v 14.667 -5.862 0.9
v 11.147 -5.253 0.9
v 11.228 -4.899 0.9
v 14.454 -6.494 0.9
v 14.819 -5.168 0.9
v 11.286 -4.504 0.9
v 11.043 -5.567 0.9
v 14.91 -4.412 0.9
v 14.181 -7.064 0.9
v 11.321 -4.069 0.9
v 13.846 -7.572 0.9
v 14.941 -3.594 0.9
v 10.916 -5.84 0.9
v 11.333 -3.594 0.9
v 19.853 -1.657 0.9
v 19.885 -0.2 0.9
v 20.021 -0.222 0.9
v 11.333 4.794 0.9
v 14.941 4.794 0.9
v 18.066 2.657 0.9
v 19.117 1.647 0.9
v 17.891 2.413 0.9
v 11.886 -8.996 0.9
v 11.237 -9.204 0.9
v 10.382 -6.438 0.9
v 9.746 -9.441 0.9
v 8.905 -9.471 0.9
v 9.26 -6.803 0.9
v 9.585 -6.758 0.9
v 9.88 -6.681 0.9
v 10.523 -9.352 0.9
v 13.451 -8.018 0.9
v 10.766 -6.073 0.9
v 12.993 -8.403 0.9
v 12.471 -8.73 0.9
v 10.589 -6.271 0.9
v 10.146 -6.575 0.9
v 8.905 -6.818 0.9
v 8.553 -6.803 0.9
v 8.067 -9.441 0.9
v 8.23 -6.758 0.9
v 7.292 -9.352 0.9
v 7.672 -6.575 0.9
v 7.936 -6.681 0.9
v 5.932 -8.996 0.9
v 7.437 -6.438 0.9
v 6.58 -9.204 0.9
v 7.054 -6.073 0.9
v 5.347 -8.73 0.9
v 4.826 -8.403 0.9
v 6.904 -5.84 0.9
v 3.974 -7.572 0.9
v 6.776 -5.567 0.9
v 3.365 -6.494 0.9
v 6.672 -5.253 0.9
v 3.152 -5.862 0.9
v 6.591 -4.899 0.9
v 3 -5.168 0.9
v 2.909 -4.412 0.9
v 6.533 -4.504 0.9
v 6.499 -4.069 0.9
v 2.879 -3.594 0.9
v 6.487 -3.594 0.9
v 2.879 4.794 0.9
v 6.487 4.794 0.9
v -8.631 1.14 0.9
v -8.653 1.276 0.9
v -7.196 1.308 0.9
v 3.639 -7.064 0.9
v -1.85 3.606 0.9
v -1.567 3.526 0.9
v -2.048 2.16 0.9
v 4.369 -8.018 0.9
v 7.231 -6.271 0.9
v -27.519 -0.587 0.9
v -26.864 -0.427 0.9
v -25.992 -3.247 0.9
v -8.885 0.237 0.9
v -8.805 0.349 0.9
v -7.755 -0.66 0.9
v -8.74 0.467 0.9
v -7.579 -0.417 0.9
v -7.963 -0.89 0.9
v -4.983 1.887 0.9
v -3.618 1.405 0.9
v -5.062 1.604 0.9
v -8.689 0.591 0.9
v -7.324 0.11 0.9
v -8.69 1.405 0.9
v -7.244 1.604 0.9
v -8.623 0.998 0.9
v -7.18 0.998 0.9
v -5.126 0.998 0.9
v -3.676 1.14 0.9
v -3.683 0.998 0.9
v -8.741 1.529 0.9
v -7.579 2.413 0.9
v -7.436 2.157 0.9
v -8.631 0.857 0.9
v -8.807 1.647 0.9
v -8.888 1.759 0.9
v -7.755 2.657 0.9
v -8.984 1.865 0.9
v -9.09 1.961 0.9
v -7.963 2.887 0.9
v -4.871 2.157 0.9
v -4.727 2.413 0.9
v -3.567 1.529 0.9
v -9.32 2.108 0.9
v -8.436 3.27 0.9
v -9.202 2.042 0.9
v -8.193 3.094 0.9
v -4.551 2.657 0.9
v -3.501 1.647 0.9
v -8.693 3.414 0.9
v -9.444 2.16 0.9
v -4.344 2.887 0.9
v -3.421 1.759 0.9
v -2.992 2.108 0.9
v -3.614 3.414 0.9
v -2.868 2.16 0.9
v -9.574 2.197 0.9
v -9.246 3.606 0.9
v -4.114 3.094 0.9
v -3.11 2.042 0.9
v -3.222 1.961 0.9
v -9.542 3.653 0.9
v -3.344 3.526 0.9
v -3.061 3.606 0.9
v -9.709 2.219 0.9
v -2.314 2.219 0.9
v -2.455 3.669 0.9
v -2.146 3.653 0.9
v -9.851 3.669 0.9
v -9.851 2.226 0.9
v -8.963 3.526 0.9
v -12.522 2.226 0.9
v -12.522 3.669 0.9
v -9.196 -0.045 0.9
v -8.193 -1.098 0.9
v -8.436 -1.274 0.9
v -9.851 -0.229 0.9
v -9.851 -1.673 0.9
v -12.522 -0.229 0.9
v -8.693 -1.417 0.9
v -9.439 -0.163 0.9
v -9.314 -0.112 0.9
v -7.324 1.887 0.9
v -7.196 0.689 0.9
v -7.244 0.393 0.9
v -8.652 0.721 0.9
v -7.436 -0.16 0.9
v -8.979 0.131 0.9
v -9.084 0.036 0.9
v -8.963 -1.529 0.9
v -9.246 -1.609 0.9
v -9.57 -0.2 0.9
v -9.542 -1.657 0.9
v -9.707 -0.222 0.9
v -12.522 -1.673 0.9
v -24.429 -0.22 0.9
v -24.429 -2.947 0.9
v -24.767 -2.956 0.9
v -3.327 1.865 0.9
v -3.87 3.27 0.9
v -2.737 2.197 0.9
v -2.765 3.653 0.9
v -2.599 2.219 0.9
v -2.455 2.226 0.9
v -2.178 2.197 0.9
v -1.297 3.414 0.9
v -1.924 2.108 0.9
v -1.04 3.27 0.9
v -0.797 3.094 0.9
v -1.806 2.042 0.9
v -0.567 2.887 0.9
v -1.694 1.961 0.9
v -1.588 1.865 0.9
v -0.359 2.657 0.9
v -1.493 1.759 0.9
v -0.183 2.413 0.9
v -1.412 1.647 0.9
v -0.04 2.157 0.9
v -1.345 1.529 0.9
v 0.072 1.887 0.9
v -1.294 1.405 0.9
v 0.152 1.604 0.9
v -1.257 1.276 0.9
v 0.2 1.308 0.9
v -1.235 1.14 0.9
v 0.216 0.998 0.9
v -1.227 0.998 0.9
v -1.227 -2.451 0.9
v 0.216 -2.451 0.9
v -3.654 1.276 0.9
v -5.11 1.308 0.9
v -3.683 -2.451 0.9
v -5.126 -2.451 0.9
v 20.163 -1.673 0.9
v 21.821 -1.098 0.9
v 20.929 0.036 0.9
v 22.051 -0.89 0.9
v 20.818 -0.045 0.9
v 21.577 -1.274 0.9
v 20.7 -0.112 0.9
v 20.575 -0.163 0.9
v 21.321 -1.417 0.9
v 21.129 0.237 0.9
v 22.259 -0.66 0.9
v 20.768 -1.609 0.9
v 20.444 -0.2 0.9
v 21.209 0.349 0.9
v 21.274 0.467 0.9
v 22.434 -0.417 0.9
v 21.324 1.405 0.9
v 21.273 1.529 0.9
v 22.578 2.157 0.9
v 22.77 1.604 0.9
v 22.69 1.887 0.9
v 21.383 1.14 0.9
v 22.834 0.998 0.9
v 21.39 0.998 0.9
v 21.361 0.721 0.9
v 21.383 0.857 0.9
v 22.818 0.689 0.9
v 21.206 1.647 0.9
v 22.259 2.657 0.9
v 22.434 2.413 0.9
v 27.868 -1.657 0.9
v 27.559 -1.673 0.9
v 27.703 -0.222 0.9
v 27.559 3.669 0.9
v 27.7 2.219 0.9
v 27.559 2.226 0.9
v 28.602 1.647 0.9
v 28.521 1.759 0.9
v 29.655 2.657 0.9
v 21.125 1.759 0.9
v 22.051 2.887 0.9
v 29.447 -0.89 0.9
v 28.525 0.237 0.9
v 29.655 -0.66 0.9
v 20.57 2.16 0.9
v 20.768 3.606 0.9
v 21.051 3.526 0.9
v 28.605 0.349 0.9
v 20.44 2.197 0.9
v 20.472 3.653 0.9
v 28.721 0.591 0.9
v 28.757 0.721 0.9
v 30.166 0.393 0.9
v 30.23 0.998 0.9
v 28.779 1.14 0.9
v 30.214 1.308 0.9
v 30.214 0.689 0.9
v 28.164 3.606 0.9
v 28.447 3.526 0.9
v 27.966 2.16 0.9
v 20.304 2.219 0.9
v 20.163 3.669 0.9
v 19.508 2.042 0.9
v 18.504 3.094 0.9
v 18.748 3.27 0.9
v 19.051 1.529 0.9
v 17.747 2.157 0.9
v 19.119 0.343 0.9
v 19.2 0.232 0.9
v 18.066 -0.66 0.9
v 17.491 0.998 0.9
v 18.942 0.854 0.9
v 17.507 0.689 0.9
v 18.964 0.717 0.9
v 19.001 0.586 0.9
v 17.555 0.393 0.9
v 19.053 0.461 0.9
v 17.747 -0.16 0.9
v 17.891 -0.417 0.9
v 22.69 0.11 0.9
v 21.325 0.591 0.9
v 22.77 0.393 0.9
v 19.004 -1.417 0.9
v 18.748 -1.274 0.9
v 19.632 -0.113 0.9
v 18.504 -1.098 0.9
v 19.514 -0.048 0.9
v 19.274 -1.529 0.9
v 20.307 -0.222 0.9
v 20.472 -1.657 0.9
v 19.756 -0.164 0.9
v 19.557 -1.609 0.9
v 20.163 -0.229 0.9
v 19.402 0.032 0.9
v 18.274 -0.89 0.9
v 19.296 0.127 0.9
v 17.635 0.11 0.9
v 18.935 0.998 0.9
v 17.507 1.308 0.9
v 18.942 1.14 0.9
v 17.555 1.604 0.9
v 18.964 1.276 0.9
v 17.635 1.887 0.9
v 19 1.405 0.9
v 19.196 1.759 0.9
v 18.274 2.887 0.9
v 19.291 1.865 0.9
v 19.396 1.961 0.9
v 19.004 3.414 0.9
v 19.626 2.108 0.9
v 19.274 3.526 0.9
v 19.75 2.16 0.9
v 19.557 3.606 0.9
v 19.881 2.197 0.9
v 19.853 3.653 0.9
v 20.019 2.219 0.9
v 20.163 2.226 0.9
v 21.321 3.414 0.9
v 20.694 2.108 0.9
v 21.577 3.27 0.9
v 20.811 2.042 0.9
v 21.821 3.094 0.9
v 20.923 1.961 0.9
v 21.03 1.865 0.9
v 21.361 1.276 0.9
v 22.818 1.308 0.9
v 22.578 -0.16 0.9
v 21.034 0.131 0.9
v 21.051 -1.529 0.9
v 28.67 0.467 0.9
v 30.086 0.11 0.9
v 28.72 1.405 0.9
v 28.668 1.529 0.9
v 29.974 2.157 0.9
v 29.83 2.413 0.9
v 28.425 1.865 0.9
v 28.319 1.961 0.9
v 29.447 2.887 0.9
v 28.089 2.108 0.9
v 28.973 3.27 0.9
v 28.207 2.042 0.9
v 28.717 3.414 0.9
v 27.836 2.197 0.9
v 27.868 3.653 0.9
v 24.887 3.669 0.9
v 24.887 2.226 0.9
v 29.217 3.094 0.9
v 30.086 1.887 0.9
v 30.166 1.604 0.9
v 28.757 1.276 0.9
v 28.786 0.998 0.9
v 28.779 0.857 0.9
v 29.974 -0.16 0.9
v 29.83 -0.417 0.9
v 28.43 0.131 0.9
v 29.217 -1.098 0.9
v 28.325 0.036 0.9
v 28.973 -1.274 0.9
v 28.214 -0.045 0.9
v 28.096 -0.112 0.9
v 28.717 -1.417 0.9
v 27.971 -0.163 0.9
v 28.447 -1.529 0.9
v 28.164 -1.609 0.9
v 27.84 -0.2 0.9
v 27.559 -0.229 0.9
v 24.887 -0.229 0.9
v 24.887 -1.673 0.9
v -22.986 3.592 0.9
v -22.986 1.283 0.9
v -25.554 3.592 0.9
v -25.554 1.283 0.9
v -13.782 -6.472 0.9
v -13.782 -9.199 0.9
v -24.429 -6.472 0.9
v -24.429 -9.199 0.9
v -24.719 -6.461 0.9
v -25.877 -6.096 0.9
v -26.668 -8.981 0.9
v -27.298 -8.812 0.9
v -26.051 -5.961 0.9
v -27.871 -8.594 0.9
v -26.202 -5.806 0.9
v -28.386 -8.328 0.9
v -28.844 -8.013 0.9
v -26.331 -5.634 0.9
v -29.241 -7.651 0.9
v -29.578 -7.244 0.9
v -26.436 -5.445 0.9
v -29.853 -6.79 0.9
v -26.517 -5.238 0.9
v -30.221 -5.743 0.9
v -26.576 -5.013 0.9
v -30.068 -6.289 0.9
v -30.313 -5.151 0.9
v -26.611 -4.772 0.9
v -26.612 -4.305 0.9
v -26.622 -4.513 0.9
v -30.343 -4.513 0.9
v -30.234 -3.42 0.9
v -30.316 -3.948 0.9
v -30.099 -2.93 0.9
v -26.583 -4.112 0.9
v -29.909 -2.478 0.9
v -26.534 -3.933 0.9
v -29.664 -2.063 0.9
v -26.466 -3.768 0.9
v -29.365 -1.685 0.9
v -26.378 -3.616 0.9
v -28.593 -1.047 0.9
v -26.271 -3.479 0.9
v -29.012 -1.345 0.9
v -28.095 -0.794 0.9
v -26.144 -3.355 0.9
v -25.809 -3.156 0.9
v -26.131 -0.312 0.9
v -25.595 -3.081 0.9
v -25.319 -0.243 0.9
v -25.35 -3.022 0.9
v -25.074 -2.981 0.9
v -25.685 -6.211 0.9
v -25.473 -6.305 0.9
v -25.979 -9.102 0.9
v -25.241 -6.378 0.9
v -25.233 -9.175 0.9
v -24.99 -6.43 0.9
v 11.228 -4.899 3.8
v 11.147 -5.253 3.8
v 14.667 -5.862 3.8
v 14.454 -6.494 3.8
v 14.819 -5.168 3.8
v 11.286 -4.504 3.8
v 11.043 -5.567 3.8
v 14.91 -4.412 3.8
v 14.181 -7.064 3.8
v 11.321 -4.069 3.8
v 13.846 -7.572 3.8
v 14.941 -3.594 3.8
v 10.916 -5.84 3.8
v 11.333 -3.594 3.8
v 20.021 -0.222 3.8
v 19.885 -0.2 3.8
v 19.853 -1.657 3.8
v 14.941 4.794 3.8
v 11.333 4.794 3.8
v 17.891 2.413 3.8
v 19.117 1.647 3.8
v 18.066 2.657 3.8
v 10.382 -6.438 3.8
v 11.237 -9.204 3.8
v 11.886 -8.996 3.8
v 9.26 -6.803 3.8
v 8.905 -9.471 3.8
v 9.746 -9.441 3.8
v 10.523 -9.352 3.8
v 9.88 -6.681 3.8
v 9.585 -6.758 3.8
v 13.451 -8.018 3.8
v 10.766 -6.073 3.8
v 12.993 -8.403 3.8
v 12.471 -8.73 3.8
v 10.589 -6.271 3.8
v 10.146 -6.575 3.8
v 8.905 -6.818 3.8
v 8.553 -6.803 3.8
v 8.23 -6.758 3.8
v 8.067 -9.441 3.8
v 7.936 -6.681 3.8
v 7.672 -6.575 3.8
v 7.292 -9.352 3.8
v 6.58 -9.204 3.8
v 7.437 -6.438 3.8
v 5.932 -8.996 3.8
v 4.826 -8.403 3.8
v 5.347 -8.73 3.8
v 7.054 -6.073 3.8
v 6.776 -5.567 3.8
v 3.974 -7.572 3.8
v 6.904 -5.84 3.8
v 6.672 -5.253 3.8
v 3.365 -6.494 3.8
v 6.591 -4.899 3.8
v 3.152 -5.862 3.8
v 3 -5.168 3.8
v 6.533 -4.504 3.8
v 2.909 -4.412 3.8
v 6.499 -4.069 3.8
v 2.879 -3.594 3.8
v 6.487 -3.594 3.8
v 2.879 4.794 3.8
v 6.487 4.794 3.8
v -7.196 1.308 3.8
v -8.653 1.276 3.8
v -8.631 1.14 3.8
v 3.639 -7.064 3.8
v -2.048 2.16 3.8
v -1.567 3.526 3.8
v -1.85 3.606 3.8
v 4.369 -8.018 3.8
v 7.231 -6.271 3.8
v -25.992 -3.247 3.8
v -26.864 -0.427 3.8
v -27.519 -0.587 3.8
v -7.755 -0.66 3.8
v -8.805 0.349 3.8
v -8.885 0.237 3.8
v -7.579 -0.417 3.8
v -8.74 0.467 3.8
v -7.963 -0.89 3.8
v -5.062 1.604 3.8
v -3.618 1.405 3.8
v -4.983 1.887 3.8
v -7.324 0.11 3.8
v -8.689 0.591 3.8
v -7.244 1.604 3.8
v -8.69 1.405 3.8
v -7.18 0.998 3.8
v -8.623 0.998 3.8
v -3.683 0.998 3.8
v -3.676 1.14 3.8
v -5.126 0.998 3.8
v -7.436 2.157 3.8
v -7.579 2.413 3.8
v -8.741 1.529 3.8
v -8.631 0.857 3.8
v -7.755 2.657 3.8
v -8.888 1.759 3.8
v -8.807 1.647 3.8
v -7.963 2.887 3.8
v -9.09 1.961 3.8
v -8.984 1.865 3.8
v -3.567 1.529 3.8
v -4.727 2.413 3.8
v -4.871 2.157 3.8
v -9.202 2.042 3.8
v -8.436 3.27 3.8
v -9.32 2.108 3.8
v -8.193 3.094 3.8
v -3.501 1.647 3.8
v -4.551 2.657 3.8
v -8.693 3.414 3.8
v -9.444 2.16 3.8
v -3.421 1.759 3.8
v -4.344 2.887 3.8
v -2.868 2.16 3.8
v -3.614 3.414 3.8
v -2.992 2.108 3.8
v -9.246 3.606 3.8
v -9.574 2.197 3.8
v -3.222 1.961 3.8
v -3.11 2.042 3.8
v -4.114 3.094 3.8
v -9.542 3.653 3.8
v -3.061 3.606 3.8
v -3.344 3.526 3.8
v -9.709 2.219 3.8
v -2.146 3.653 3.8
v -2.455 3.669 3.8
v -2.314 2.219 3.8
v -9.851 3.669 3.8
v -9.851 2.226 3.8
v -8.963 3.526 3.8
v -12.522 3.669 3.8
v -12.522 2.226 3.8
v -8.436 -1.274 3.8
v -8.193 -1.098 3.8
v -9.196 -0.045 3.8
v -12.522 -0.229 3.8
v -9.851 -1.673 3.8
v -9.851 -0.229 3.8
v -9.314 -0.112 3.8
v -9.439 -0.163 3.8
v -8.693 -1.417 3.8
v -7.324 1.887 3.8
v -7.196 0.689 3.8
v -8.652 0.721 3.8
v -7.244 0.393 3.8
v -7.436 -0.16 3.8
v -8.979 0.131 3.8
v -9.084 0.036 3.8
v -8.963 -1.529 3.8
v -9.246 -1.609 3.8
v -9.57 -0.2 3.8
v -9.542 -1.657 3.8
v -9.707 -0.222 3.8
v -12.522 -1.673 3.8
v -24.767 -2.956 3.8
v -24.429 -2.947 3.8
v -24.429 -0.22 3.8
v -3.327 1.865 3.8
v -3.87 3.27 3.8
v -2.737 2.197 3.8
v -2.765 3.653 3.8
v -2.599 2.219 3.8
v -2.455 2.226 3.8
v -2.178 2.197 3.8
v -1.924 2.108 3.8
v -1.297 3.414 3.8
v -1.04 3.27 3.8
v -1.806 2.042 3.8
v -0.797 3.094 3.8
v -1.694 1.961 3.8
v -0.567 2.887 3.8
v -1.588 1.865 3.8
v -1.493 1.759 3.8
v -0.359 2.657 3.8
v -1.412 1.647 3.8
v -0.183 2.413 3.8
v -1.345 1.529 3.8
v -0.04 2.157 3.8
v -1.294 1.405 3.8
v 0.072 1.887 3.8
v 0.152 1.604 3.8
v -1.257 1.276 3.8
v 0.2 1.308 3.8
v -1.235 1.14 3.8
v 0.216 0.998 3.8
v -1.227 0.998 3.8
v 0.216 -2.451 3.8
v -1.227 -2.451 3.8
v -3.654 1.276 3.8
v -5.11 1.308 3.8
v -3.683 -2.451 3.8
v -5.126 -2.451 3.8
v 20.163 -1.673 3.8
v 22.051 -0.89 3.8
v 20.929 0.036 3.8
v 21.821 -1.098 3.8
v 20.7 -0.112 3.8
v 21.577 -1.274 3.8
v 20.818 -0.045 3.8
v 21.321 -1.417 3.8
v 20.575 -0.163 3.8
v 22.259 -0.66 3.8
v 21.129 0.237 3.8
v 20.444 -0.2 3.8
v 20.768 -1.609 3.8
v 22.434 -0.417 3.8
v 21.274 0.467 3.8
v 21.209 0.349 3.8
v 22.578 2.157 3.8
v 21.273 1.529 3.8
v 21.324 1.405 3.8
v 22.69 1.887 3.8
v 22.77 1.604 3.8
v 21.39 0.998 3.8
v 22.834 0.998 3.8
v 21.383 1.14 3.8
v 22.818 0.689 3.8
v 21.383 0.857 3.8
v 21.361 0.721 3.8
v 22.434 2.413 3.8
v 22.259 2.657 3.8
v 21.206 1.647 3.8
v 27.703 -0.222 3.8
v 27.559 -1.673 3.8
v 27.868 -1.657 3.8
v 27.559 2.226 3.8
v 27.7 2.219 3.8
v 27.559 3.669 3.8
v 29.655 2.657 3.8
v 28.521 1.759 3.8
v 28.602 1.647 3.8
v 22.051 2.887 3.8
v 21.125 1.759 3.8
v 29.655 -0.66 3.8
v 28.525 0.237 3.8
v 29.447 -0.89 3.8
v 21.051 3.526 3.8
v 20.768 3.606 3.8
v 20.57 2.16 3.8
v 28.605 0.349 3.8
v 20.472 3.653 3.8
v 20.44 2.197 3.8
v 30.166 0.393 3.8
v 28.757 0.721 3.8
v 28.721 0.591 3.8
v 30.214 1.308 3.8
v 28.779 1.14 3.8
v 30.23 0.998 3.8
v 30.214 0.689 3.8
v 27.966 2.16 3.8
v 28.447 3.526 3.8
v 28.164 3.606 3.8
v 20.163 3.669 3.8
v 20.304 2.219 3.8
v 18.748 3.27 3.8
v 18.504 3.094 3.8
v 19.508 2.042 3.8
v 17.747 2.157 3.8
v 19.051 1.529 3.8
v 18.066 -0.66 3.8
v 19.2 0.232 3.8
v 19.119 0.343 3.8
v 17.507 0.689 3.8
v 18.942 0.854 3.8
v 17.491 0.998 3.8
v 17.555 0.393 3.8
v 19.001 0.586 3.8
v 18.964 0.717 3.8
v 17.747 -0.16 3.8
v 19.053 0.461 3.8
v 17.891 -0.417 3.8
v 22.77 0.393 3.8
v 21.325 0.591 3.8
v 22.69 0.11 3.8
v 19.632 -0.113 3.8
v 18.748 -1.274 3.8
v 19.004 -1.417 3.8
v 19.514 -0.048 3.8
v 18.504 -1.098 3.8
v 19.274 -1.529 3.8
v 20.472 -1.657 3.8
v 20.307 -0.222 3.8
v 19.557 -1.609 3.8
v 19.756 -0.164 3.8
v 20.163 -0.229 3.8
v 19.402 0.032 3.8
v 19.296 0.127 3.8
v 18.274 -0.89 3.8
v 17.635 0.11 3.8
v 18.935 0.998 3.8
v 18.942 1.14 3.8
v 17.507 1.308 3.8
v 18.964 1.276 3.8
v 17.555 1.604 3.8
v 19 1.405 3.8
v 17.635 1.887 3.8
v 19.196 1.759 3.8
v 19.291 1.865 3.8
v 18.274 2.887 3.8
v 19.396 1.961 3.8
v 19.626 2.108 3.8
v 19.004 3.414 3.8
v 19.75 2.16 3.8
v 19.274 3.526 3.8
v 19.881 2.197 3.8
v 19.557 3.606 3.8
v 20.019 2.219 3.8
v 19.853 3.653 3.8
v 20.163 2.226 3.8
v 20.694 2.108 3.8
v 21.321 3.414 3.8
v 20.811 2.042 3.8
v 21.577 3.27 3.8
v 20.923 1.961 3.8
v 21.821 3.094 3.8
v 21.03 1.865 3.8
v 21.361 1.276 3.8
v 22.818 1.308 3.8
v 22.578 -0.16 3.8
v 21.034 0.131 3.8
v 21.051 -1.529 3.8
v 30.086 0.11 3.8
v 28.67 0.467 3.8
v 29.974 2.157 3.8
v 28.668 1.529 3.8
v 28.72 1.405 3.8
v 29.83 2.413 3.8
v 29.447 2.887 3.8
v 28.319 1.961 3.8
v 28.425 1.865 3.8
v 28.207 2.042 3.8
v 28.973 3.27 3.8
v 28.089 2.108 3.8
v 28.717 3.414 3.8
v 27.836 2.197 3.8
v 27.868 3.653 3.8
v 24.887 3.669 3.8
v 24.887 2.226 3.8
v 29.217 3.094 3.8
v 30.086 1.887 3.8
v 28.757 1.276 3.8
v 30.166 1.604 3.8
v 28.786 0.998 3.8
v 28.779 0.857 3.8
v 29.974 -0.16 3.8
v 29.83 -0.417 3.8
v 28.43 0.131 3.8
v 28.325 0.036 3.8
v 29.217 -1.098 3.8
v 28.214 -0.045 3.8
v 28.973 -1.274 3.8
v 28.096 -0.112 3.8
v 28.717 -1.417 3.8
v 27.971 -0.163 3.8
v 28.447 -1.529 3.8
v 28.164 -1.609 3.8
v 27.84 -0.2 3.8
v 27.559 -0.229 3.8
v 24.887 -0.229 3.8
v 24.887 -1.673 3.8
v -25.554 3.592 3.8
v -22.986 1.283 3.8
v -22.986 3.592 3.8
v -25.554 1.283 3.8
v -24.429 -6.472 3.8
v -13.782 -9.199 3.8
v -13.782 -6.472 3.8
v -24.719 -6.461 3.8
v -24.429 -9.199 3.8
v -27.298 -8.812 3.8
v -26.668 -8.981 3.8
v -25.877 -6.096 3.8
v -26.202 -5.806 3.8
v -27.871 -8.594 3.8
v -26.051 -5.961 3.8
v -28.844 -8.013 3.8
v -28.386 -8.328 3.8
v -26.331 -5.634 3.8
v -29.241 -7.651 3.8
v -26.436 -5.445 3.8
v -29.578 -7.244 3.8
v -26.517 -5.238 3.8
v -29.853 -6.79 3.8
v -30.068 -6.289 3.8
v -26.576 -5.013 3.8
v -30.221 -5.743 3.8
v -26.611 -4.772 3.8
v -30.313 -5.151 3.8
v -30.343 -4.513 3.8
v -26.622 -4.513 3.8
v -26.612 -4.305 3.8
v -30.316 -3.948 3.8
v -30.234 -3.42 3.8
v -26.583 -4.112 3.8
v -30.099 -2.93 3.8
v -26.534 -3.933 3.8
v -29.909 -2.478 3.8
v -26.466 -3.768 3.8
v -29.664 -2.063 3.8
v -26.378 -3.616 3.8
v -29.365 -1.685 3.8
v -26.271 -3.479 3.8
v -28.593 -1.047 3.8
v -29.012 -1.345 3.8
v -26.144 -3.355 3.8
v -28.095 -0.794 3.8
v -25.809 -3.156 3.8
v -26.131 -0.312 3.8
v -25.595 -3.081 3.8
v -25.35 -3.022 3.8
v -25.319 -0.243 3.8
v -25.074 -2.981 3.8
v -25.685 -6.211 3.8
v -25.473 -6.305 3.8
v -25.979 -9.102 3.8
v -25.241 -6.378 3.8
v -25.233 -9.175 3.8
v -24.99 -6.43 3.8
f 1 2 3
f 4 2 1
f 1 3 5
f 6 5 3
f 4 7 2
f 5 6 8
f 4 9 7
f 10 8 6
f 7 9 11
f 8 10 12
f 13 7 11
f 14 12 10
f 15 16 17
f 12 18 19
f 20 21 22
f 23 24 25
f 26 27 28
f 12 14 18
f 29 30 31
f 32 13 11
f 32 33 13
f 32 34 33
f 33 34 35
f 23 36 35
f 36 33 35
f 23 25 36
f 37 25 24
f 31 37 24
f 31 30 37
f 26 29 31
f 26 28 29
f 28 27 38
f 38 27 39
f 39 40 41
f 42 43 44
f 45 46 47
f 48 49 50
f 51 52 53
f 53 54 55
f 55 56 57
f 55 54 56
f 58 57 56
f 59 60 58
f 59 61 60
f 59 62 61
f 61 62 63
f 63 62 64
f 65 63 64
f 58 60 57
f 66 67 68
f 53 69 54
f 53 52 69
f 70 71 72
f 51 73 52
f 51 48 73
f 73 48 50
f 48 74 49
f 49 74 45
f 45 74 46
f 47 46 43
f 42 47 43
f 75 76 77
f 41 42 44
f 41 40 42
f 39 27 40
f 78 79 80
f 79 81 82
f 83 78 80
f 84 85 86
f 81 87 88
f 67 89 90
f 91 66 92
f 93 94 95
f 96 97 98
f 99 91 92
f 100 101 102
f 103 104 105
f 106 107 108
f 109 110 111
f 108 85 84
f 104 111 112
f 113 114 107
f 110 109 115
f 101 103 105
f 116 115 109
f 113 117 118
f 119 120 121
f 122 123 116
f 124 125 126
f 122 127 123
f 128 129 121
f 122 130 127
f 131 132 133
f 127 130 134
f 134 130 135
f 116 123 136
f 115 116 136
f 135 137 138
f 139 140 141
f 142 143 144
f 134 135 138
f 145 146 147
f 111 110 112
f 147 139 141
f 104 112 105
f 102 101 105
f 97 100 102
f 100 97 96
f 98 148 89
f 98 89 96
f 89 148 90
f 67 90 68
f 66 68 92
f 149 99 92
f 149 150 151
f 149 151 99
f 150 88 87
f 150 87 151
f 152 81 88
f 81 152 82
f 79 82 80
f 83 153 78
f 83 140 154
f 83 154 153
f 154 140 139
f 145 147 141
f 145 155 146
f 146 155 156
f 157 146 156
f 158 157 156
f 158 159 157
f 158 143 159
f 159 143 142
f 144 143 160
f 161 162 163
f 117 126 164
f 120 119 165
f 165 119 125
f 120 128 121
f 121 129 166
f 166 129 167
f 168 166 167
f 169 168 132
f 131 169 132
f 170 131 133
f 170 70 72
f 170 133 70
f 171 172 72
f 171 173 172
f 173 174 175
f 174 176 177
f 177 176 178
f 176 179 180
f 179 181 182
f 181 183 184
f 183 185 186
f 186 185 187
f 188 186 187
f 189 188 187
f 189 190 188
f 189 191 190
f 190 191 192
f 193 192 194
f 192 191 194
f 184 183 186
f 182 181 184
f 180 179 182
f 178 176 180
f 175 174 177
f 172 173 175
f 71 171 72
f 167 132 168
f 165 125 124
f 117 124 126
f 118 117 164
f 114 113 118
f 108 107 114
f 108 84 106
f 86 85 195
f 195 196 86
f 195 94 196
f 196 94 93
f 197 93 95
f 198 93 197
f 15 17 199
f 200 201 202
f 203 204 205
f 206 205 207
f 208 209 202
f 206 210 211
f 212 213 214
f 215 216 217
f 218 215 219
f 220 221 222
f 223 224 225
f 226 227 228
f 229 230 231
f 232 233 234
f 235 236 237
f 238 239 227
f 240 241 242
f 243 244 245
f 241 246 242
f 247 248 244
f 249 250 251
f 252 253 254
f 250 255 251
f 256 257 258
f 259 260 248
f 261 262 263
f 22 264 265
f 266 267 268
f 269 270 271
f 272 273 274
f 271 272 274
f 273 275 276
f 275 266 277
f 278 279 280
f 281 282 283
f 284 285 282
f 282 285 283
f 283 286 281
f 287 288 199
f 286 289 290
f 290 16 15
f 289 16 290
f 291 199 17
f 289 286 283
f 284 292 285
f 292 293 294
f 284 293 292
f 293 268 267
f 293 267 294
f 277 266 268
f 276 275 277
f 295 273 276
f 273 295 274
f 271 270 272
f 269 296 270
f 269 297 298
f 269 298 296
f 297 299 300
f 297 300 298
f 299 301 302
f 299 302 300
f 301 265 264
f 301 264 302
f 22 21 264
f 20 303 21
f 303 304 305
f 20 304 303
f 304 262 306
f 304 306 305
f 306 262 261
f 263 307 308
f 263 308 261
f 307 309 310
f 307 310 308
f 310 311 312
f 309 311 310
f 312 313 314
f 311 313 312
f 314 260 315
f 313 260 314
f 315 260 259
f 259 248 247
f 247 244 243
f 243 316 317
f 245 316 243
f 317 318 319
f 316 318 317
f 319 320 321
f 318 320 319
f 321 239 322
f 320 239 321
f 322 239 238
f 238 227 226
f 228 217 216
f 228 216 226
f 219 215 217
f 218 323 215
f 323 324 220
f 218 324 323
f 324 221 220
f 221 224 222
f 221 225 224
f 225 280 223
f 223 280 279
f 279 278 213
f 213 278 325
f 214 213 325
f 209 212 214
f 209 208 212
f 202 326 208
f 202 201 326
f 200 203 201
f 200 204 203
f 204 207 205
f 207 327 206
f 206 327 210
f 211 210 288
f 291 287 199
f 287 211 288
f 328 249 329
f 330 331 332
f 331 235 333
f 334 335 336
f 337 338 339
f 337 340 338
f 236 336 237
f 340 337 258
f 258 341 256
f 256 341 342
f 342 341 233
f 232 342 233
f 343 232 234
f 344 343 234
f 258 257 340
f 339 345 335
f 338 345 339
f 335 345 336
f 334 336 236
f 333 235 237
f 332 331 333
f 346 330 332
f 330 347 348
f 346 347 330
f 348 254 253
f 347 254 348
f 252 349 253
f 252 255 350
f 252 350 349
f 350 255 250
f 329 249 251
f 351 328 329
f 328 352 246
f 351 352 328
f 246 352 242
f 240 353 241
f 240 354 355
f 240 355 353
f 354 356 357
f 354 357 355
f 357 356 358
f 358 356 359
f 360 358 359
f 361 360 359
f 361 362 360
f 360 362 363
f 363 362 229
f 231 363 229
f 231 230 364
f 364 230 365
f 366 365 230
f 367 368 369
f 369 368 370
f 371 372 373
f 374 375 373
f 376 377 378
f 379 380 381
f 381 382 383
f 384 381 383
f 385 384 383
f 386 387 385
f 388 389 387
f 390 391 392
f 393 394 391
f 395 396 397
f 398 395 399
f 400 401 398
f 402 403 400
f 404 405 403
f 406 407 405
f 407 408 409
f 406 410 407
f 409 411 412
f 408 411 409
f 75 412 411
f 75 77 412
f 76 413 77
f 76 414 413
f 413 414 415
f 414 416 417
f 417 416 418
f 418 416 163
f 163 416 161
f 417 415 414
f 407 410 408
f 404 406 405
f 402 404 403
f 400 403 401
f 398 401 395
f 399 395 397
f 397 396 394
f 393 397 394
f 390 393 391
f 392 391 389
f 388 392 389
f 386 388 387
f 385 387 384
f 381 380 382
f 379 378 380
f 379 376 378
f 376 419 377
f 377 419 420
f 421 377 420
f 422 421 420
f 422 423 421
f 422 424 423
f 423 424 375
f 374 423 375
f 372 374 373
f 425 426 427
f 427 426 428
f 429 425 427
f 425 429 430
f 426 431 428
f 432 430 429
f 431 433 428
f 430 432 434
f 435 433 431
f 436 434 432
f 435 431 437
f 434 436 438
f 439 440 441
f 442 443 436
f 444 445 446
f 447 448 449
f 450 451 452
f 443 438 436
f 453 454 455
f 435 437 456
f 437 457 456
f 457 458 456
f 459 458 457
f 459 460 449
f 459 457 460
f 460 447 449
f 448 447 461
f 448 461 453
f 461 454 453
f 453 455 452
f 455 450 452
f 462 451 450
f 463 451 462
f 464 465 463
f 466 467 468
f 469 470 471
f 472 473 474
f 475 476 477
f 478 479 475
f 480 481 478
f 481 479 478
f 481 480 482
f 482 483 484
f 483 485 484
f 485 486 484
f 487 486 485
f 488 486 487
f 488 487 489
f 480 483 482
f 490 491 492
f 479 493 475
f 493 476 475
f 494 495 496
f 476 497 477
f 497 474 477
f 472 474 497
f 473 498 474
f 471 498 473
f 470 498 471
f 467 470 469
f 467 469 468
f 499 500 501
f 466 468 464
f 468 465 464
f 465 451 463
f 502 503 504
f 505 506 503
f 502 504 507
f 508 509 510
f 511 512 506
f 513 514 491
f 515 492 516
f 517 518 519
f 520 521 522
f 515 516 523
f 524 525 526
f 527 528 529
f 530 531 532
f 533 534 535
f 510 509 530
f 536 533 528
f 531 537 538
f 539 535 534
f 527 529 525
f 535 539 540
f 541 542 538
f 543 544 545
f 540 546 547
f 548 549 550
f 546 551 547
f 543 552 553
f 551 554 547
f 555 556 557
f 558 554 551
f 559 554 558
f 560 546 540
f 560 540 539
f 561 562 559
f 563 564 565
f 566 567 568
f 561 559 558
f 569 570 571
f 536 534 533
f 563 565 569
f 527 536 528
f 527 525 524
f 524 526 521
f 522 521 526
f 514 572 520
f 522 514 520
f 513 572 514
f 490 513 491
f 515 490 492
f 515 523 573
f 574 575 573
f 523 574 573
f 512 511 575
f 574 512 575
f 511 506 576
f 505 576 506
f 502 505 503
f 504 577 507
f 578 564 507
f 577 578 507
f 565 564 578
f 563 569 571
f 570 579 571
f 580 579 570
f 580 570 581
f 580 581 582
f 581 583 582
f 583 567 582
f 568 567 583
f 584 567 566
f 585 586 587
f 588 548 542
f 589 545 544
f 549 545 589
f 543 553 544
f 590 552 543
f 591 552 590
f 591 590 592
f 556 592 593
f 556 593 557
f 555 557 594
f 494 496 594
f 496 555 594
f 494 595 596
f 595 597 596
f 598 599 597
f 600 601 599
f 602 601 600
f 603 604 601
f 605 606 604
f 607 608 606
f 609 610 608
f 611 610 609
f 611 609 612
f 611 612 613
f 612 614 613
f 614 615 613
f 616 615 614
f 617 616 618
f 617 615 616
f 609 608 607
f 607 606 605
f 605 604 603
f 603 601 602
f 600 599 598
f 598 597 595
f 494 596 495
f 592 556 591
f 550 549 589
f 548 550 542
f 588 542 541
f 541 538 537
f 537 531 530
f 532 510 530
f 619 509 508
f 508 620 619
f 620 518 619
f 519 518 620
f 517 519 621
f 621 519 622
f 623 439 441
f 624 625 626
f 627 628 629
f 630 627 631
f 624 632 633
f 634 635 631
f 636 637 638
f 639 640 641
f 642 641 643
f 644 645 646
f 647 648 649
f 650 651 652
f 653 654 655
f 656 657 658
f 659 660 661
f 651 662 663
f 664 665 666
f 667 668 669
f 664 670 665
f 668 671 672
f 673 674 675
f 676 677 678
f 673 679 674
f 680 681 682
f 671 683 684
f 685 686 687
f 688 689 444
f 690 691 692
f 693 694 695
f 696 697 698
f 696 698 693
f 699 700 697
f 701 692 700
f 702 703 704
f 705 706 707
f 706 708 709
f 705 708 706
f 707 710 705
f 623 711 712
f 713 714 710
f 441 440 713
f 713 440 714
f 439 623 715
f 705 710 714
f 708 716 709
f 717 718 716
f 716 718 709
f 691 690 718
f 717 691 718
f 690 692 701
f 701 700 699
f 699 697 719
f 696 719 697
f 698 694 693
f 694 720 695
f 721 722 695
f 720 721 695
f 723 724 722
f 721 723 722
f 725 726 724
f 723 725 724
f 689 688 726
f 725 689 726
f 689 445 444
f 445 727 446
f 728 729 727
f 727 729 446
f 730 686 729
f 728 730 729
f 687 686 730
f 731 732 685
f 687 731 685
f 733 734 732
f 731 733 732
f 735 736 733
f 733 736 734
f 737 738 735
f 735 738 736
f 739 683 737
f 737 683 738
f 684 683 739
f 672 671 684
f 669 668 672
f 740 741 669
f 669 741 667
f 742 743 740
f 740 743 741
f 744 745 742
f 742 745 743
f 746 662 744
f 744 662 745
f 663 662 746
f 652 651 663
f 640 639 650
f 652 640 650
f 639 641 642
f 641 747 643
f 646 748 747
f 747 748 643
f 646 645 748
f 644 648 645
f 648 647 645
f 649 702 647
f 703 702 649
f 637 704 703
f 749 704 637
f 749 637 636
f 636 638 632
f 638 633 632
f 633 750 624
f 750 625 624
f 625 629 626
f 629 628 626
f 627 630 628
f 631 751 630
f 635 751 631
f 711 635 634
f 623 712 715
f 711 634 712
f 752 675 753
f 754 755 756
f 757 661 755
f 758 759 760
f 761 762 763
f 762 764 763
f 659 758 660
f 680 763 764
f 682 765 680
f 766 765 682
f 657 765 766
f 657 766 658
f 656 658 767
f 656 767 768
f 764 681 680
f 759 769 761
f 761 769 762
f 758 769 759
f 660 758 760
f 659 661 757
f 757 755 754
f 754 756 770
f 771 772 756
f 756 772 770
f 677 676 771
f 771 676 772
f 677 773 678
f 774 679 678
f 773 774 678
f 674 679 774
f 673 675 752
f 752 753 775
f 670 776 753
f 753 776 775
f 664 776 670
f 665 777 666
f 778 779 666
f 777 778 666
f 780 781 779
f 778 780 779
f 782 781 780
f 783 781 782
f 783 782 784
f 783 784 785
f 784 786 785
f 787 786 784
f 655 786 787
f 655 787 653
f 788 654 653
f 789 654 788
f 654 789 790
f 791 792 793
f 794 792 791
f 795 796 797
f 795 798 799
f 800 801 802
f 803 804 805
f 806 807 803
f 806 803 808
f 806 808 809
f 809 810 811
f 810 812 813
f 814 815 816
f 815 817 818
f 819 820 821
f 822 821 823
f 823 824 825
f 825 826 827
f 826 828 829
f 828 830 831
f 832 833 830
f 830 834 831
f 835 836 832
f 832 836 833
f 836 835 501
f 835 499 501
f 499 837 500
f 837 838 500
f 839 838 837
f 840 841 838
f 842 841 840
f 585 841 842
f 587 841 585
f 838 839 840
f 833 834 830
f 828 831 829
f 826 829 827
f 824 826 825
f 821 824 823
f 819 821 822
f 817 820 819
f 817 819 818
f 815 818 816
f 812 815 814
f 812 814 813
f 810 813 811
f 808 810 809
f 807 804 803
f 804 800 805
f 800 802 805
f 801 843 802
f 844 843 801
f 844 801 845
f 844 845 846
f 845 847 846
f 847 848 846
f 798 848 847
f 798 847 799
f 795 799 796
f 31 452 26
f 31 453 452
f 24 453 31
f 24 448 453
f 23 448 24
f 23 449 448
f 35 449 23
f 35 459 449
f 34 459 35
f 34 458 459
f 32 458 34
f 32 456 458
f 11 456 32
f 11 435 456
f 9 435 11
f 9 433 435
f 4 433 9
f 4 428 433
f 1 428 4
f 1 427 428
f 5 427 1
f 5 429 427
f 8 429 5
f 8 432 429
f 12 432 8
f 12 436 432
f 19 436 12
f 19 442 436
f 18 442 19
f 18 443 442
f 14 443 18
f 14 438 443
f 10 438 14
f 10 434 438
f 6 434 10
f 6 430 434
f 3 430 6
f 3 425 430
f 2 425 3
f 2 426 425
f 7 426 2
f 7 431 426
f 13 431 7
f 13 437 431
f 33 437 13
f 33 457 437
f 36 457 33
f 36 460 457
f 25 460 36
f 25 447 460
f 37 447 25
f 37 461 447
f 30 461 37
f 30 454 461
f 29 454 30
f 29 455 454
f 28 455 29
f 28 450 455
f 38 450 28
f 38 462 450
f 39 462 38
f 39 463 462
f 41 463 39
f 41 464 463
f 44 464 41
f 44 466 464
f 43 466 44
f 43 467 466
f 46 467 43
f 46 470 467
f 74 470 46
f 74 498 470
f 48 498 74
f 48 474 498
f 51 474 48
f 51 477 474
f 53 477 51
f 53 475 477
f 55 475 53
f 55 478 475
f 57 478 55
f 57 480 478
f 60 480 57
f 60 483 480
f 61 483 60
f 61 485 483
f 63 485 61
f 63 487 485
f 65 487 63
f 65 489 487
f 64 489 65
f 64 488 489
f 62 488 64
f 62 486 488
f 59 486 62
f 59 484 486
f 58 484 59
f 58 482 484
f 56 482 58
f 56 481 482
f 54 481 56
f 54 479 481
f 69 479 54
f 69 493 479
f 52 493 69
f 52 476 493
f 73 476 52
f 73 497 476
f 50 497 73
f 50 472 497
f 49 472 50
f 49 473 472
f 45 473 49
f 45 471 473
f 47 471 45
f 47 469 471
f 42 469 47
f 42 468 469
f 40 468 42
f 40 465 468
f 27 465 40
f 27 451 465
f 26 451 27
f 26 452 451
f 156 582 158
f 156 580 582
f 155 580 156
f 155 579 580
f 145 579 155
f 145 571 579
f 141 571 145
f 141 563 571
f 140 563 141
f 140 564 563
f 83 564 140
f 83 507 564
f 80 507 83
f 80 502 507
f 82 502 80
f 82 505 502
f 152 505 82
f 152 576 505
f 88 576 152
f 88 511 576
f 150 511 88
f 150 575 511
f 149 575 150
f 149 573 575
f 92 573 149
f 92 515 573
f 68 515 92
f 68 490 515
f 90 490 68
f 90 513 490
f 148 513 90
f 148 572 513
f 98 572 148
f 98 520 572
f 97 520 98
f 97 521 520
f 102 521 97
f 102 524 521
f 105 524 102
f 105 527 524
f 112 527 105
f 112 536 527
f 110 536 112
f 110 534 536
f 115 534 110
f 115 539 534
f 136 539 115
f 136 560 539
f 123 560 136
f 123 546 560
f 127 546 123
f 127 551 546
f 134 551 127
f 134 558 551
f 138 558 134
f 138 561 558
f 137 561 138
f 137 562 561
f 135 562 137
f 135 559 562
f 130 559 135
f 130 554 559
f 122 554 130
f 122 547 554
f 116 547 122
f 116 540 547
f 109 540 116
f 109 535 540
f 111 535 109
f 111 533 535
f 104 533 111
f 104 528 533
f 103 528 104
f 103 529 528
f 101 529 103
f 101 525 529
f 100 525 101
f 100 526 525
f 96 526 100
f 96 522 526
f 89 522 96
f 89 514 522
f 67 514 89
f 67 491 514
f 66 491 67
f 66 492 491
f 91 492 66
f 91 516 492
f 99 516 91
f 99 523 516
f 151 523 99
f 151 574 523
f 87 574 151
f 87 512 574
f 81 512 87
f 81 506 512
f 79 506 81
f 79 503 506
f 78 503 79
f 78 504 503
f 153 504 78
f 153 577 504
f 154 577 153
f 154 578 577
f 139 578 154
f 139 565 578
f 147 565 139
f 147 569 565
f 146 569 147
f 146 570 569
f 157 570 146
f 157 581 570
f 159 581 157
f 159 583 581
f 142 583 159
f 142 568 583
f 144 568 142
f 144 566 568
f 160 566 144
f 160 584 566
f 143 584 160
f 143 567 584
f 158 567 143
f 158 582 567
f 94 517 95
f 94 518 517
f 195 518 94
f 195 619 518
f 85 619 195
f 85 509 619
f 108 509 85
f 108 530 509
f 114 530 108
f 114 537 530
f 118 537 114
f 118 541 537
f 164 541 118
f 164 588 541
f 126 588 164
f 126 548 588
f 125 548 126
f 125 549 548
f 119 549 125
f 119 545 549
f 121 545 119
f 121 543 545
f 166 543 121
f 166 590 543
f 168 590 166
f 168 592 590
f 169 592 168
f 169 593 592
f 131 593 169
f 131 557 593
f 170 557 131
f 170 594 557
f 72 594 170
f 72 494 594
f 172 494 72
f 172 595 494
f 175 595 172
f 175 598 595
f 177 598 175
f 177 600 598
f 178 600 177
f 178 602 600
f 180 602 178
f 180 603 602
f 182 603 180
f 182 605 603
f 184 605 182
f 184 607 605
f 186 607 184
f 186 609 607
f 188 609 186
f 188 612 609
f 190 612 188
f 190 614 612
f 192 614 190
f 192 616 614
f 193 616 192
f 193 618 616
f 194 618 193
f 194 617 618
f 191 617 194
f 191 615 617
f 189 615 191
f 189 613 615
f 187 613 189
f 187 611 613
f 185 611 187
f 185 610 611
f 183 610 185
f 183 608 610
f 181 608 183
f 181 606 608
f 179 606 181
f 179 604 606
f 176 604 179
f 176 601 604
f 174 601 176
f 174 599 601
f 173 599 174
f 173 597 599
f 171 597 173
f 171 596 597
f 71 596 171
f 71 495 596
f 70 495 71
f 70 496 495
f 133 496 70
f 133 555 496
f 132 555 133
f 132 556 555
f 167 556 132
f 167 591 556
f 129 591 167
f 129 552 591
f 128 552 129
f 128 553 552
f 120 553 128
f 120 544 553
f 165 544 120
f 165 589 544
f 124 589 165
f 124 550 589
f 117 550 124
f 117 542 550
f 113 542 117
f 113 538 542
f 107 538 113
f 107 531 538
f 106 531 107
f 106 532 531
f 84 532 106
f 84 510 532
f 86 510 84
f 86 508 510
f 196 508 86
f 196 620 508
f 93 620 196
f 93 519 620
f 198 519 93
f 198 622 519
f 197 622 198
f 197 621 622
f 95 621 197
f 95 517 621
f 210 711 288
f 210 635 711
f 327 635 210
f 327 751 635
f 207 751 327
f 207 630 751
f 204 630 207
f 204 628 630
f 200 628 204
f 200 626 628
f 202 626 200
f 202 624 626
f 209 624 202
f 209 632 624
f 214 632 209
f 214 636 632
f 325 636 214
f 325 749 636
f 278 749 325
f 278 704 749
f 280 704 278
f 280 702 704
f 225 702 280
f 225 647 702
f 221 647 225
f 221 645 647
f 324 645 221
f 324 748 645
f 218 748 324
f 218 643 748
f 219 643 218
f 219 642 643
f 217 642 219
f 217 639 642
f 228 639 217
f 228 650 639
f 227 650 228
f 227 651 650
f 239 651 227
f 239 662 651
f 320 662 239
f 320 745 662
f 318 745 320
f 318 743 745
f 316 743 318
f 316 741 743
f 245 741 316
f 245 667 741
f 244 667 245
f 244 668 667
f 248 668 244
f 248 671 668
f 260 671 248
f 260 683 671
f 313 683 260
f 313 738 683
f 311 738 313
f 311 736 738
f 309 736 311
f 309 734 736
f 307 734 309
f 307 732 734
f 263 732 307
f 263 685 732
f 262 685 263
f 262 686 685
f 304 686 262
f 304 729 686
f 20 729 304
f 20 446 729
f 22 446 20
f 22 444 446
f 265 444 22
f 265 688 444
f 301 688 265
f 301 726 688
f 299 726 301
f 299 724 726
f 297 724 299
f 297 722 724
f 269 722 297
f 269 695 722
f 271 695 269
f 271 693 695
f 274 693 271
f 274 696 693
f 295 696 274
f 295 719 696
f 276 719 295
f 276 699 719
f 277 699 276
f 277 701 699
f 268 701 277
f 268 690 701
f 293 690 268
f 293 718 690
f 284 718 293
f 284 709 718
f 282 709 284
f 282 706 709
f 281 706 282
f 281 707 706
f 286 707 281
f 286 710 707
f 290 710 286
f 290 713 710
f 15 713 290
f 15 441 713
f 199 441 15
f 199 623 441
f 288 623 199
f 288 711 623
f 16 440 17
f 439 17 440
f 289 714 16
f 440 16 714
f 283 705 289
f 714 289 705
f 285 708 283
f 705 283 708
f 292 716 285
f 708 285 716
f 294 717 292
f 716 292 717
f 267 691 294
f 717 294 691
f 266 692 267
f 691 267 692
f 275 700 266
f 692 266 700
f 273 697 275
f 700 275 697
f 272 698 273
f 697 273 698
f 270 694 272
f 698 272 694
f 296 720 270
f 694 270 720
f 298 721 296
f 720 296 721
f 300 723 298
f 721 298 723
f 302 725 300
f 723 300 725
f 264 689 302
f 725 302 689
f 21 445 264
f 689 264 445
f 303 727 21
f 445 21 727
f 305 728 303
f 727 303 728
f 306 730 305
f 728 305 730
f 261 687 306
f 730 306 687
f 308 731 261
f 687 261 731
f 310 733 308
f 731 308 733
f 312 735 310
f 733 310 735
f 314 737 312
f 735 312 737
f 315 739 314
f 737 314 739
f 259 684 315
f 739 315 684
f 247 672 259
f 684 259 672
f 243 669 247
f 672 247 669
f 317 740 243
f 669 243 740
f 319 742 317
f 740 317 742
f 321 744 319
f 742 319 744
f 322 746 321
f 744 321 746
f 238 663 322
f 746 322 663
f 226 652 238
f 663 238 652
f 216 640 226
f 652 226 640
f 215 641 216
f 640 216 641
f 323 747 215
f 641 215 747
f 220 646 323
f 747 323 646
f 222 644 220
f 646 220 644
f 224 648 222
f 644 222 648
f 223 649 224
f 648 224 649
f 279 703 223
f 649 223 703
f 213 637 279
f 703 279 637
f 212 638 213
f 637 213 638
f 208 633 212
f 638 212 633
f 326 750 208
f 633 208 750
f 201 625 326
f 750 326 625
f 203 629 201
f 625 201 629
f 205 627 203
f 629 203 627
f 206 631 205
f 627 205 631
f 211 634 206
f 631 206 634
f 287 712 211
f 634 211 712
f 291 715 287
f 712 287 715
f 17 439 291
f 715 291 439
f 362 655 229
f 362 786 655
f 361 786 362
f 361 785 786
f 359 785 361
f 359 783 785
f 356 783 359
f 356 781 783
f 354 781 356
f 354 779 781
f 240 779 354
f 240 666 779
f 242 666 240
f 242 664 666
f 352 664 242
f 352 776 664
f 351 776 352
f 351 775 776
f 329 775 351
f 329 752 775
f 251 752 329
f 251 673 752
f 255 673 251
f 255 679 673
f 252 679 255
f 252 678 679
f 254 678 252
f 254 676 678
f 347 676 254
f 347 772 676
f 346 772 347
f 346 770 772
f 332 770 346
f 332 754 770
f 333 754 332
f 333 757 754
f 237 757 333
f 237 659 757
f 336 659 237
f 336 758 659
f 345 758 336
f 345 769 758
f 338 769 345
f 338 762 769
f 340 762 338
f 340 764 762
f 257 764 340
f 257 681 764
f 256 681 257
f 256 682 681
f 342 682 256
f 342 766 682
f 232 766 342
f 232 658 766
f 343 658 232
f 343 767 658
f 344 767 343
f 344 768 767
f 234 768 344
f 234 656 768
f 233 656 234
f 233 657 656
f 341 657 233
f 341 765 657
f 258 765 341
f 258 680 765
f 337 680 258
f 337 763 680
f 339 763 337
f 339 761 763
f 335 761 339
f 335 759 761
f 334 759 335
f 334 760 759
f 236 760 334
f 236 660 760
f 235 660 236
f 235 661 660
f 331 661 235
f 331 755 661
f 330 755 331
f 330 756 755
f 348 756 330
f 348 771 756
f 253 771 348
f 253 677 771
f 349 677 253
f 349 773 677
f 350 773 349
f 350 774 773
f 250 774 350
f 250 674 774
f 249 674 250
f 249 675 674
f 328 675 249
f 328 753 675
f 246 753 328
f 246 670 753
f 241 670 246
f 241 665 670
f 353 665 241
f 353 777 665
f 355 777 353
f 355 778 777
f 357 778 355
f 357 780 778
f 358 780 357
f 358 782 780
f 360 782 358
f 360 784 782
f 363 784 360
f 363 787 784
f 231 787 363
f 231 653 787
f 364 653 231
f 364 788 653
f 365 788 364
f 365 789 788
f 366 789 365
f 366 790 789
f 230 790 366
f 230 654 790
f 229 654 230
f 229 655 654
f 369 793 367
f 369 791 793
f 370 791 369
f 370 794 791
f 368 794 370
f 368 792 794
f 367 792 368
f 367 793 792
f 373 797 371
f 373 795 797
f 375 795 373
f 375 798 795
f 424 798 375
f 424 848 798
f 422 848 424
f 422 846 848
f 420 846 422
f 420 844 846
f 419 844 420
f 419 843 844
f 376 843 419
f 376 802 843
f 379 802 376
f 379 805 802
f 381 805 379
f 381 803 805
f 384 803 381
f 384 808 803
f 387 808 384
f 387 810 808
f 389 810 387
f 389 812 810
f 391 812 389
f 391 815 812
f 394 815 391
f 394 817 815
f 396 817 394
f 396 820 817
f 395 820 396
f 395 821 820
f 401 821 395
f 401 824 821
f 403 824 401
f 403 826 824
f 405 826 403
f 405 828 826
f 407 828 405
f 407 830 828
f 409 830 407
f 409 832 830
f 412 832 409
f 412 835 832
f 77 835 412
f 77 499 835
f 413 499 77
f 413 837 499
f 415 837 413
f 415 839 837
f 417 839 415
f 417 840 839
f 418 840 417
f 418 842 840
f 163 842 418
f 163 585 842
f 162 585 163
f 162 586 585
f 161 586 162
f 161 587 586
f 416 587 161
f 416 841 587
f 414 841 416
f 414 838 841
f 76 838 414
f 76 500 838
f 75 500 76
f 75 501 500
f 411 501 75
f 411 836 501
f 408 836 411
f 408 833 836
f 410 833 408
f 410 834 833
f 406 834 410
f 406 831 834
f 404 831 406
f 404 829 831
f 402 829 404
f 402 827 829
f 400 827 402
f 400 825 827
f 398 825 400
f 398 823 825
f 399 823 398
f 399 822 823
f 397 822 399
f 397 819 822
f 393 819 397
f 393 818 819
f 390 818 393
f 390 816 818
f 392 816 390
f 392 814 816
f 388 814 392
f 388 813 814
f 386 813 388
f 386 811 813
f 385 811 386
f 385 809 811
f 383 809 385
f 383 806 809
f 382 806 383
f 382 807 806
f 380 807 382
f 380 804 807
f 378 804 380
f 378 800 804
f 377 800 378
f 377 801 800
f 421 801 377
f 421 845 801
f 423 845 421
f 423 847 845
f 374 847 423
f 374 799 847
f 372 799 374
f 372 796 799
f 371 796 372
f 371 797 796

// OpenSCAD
$fn = 48;
  // syllabics (overlaid on icon, tallest)
  translate([0, -2.500, 0.900]) linear_extrude(height=2.900) text("ᓛᐣᐢᑌᐤᐣ", size=13.821, halign="center", valign="center", font="Euphemia UCAS:style=Bold");
